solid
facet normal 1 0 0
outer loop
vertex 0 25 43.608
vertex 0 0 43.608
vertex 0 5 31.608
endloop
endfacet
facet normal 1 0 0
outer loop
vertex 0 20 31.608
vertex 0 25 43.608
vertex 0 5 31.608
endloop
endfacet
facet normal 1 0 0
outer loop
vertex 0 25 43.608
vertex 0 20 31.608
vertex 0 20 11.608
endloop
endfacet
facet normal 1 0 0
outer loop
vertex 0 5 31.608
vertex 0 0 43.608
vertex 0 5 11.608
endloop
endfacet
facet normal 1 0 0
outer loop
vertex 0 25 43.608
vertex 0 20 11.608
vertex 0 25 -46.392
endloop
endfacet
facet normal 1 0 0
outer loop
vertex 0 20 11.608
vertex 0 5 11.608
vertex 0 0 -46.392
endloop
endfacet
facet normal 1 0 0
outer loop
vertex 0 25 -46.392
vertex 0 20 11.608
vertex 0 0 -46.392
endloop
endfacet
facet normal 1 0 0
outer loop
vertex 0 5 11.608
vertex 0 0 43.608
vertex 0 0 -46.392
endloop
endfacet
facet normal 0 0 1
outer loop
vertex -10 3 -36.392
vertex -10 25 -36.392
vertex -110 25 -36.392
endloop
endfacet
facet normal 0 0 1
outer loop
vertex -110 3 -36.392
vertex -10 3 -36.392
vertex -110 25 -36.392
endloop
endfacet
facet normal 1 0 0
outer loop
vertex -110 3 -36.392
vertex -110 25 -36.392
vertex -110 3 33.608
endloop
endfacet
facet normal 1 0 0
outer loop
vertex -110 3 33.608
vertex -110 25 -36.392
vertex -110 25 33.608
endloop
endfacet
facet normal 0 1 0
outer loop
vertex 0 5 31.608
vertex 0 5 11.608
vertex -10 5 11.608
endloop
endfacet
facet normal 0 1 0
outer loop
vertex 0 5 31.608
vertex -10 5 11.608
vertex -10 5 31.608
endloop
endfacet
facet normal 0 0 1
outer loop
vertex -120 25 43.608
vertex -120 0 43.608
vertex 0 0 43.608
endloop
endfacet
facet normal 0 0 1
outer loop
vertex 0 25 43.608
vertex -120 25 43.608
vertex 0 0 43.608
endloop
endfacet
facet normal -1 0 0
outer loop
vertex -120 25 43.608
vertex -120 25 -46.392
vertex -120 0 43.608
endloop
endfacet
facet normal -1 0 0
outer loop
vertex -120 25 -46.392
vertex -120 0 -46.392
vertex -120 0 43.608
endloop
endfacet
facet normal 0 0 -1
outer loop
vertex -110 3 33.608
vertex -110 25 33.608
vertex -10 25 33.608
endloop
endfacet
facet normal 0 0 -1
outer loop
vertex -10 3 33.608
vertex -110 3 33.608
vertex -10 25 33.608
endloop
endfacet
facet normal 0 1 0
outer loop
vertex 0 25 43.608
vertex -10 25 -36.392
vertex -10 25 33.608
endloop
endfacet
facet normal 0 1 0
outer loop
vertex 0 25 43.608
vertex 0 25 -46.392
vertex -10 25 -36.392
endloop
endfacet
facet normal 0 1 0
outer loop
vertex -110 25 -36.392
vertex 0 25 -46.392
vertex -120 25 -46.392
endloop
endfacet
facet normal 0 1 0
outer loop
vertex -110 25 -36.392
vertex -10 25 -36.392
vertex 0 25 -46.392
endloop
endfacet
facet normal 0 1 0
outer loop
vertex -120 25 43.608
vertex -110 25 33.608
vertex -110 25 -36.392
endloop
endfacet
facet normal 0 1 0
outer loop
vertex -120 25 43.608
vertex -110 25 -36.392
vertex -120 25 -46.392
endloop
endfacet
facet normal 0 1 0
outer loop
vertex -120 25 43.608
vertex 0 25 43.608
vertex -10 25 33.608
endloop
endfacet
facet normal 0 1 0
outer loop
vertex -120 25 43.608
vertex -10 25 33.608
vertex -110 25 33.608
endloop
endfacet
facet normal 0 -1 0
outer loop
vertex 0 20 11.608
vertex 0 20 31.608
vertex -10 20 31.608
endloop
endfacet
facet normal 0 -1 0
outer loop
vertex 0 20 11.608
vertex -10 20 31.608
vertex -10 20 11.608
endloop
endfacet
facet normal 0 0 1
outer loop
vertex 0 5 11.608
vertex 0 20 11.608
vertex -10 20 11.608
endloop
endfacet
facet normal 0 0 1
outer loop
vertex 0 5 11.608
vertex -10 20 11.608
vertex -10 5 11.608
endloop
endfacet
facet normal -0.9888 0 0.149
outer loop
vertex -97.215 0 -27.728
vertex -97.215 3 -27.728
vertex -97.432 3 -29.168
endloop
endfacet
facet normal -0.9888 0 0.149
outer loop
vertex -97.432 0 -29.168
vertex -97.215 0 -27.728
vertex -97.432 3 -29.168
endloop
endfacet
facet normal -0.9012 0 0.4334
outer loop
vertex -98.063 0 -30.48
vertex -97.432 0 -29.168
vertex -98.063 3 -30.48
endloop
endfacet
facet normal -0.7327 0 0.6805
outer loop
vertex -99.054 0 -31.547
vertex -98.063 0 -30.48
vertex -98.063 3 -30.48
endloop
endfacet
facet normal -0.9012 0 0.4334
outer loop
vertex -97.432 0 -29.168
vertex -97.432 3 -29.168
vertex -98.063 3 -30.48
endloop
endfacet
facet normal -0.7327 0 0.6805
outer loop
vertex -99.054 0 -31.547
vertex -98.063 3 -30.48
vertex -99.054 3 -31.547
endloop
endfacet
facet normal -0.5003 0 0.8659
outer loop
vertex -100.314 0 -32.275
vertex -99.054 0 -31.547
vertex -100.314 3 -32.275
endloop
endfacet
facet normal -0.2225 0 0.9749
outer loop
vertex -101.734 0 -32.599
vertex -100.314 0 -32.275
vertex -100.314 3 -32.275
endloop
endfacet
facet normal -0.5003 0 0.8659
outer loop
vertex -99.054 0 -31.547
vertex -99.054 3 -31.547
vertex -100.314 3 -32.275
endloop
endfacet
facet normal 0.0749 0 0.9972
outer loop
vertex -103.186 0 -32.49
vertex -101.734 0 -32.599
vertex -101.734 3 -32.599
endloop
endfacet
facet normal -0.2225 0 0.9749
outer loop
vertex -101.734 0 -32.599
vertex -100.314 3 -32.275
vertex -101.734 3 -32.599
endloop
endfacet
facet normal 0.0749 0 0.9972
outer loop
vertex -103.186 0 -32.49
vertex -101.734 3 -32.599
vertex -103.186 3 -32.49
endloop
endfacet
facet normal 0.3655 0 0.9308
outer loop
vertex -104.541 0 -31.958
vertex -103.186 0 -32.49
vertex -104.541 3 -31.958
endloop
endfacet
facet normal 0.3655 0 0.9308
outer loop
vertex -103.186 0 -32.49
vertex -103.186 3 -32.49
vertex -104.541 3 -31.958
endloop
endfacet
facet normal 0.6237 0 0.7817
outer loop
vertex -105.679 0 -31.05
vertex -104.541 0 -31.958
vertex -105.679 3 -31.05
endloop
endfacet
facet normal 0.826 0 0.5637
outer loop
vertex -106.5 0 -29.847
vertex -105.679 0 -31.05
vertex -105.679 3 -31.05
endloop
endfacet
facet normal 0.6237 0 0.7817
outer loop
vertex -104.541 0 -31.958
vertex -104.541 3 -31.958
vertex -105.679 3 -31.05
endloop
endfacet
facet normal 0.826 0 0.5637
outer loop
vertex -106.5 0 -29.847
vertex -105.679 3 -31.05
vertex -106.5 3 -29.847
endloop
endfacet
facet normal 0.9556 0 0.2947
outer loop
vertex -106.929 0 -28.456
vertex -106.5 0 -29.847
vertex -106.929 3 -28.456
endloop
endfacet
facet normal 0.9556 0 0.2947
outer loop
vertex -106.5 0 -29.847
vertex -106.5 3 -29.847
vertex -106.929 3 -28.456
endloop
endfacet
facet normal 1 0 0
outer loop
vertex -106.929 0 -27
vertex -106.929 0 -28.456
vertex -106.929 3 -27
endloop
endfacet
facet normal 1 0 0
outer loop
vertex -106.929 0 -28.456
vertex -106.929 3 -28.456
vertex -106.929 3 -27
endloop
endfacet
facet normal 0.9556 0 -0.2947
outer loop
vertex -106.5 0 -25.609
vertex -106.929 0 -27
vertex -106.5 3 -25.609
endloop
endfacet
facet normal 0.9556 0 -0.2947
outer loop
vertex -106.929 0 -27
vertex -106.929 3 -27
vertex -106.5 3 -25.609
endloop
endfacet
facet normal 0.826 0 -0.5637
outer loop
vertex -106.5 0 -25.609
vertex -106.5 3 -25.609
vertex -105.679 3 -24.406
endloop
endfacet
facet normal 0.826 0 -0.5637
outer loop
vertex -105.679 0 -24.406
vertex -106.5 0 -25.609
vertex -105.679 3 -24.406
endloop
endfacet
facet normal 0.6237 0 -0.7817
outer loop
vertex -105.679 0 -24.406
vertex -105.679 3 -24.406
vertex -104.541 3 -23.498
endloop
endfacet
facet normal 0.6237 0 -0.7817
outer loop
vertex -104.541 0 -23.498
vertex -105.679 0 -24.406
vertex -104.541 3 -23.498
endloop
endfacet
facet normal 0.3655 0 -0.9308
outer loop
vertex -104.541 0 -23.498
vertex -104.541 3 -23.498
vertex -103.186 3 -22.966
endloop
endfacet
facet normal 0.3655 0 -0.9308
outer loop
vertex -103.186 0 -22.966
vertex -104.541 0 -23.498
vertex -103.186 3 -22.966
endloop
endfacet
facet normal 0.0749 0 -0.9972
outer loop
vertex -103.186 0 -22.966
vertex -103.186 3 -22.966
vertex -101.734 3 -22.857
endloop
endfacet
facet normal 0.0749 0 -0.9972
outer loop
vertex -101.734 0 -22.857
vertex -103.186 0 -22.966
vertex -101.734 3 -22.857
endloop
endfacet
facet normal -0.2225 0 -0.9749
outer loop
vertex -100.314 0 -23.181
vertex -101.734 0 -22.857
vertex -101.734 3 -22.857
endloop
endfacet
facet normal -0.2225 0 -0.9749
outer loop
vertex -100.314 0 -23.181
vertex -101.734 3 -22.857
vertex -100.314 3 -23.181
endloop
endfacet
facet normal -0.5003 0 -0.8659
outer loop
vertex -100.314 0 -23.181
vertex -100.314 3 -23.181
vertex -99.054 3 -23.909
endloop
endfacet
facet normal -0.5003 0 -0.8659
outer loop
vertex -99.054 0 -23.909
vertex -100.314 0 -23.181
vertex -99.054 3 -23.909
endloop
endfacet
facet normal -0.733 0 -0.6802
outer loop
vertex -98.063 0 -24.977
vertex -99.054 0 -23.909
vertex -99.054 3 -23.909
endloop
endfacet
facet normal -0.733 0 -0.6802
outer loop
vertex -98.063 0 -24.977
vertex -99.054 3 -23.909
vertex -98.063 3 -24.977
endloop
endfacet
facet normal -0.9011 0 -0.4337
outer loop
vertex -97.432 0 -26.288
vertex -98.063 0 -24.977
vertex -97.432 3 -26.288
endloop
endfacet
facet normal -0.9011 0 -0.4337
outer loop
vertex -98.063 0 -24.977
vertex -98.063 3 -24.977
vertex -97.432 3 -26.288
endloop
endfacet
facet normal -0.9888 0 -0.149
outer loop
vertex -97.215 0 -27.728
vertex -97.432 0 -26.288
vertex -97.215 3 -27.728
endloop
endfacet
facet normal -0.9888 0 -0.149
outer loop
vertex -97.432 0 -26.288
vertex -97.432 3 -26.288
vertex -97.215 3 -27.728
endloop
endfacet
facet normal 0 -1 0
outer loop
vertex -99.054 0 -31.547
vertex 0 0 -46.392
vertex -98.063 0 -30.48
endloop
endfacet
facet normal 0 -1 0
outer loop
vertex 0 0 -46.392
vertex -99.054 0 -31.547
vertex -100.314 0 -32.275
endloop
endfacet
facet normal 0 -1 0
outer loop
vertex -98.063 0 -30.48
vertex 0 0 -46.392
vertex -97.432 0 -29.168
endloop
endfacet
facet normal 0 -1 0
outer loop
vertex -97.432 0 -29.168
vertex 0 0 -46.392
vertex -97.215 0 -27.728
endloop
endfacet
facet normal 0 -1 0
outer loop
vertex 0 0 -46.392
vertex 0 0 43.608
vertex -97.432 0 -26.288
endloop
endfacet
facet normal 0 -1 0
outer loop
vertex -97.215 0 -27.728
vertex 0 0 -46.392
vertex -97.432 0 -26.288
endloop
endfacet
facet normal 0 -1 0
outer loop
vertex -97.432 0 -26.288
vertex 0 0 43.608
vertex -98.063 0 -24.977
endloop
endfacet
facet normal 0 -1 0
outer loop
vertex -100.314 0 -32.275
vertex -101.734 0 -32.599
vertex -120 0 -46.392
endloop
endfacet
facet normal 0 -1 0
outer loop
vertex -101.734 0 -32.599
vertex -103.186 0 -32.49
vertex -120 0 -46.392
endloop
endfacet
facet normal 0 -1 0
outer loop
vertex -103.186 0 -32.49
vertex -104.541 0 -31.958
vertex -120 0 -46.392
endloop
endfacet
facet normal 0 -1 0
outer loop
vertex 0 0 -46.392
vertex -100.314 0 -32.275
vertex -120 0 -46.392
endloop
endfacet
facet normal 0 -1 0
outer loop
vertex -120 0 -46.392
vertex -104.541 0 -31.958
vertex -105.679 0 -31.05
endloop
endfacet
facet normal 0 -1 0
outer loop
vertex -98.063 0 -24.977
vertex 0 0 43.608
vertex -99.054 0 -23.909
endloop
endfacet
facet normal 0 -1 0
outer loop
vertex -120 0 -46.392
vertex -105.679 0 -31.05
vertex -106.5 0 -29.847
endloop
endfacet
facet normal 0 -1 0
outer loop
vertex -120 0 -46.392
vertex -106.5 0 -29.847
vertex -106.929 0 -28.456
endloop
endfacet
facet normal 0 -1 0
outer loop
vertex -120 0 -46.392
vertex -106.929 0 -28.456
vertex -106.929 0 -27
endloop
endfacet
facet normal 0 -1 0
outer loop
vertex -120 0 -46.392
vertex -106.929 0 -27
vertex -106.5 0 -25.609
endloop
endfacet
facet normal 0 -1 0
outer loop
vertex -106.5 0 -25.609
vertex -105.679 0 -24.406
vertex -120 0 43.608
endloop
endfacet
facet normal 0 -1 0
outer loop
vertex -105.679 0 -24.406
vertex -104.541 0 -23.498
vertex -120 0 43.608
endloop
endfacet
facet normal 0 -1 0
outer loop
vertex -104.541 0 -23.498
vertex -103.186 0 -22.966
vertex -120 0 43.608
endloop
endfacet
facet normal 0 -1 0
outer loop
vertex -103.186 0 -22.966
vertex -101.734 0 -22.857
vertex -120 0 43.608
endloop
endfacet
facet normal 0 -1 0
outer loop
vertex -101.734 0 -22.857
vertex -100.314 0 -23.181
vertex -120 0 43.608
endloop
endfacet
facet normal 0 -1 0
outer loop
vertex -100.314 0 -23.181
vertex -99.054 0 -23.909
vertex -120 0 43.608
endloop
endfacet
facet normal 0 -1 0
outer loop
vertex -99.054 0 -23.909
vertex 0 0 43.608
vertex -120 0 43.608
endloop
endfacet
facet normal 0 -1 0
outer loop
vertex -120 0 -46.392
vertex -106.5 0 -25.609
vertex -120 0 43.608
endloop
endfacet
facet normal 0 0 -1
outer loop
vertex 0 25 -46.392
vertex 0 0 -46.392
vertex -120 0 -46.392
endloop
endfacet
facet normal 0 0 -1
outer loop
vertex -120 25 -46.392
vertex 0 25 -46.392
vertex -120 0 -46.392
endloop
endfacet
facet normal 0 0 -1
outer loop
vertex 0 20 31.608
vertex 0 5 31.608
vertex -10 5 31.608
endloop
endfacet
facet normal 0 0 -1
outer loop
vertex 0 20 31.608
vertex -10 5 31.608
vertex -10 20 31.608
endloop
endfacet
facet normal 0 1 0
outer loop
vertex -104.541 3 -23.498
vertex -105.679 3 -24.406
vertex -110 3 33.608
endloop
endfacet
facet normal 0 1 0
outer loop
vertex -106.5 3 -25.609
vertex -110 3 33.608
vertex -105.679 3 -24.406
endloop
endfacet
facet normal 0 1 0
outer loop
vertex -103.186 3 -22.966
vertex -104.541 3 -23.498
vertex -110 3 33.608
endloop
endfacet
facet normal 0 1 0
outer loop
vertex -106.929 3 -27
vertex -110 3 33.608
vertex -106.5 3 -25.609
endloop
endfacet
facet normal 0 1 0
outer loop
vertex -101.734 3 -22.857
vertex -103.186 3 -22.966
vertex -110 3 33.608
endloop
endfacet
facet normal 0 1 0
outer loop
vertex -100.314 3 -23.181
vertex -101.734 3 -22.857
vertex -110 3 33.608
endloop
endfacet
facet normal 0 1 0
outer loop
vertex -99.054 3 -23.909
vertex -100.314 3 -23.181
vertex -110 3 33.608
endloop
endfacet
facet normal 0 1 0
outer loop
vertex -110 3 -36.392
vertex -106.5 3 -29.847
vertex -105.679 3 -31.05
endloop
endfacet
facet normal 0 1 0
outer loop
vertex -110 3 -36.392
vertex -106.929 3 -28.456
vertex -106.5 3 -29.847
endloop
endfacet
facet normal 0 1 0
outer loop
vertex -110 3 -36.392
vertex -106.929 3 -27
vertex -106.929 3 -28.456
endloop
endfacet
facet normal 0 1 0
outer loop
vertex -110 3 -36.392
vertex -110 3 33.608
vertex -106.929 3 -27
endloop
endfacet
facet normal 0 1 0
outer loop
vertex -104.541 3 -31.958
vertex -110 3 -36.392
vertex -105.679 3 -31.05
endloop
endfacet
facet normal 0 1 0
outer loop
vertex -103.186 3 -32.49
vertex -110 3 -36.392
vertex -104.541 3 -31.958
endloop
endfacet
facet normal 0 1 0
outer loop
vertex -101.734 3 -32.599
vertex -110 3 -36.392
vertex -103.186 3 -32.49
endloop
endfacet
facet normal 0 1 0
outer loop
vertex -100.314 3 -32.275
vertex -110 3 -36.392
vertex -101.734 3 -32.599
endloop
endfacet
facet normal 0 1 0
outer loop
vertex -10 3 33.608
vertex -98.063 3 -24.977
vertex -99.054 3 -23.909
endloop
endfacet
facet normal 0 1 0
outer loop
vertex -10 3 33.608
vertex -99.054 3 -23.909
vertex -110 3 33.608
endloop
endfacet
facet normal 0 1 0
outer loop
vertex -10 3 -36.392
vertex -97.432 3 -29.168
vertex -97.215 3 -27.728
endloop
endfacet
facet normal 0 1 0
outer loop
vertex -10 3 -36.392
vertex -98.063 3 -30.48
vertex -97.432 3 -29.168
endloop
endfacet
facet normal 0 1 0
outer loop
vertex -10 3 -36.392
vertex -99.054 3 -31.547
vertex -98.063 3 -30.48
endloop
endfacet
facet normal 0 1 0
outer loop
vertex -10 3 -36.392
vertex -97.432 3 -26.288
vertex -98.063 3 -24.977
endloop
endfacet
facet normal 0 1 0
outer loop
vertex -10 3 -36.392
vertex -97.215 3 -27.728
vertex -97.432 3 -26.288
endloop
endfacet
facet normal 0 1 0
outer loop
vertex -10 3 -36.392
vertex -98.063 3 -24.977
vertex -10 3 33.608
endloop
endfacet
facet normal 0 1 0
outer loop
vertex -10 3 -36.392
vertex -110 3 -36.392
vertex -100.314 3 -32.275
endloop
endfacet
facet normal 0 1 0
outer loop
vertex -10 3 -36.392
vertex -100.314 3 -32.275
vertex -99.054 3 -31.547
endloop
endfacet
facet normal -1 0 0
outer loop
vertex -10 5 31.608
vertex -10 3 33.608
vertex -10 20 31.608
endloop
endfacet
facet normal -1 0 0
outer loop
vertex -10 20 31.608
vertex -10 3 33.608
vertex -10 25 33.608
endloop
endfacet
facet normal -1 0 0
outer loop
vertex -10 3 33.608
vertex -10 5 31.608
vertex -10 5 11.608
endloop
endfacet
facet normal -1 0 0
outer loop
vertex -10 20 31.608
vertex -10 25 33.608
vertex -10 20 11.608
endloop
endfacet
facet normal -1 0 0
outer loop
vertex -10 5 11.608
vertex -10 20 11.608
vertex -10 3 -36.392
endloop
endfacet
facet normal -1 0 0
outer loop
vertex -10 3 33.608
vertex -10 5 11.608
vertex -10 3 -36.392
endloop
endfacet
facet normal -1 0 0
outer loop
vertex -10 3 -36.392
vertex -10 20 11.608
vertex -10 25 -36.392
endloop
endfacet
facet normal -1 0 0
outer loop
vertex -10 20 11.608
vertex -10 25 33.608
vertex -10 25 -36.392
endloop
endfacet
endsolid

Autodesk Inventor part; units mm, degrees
ref_plane "YZ Plane" through (0, 0, 0) normal (1, 0, 0) x (0, 1, 0)
ref_plane "XZ Plane" through (0, 0, 0) normal (0, 1, 0) x (-1, 0, 0)
ref_plane "XY Plane" through (0, 0, 0) normal (0, 0, 1) x (1, 0, 0)
sketch "Sketch1" plane through (0, 0, 0) normal (0, 1, 0) x (-1, 0, 0)
  line L0 (120, 43.6082) -> (0, 43.6082)
  line L1 (0, 43.6082) -> (0, -46.3918)
  line L2 (0, -46.3918) -> (120, -46.3918)
  line L3 (120, -46.3918) -> (120, 43.6082)
  point P0 (0, 0)
  dimension "d0" = 90
  dimension "d1" = 120
  dimension "d2" = 0
extrude "Extrusion1" add sketch "Sketch1" along normal blind 25
sketch "Sketch2" plane through (0, 25, 0) normal (0, 1, 0) x (1, 0, 0)
  line L0 (-110, -33.6082) -> (-10, -33.6082)
  line L1 (-10, -33.6082) -> (-10, 36.3918)
  line L2 (-10, 36.3918) -> (-110, 36.3918)
  line L3 (-110, 36.3918) -> (-110, -33.6082)
  line L4 (-120, -43.6082) -> (0, -43.6082) projected
  line L5 (0, 46.3918) -> (-120, 46.3918) projected
  line L6 (-120, 46.3918) -> (-120, -43.6082) projected
  line L7 (0, -43.6082) -> (0, 46.3918) projected
  point P0 (0, 0)
  dimension "d5" = 10
  dimension "d6" = 10
  dimension "d7" = 10
  dimension "d8" = 10
extrude "Extrusion2" cut sketch "Sketch2" against normal blind 22 contours L3 L2 L1 L0
sketch "Sketch4" plane through (0, 0, 43.6082) normal (1, 0, 0) x (0, 0, -1)
  line L0 (12, 20) -> (32, 20)
  line L1 (32, 20) -> (32, 5)
  line L2 (32, 5) -> (12, 5)
  line L3 (12, 5) -> (12, 20)
  line L4 (0, 25) -> (90, 25) projected
  line L5 (0, 0) -> (90, 0) projected
  line L6 (90, 0) -> (90, 25) projected
  line L7 (0, 0) -> (0, 25) projected
  point P0 (43.6082, 0)
  dimension "d13" = 5
  dimension "d14" = 5
  dimension "d16" = 20
  dimension "d19" = 12
extrude "Extrusion3" cut sketch "Sketch4" against normal blind 22 contours L0 L1 L2 L3
sketch "Sketch5" plane through (0, 3, 0) normal (0, 1, 0) x (1, 0, 0)
  circle A0 centre (-102.0989, 27.7281) radius 4.8843
  line L0 (-110, -33.6082) -> (-110, 36.3918) projected
  line L1 (-110, 36.3918) -> (-10, 36.3918) projected
  point P0 (0, 0)
  dimension "d20" = 7.9011
  dimension "d21" = 8.6636
extrude "Extrusion4" cut sketch "Sketch5" against normal blind 22
properties part number "Case_Bottom_Part"
